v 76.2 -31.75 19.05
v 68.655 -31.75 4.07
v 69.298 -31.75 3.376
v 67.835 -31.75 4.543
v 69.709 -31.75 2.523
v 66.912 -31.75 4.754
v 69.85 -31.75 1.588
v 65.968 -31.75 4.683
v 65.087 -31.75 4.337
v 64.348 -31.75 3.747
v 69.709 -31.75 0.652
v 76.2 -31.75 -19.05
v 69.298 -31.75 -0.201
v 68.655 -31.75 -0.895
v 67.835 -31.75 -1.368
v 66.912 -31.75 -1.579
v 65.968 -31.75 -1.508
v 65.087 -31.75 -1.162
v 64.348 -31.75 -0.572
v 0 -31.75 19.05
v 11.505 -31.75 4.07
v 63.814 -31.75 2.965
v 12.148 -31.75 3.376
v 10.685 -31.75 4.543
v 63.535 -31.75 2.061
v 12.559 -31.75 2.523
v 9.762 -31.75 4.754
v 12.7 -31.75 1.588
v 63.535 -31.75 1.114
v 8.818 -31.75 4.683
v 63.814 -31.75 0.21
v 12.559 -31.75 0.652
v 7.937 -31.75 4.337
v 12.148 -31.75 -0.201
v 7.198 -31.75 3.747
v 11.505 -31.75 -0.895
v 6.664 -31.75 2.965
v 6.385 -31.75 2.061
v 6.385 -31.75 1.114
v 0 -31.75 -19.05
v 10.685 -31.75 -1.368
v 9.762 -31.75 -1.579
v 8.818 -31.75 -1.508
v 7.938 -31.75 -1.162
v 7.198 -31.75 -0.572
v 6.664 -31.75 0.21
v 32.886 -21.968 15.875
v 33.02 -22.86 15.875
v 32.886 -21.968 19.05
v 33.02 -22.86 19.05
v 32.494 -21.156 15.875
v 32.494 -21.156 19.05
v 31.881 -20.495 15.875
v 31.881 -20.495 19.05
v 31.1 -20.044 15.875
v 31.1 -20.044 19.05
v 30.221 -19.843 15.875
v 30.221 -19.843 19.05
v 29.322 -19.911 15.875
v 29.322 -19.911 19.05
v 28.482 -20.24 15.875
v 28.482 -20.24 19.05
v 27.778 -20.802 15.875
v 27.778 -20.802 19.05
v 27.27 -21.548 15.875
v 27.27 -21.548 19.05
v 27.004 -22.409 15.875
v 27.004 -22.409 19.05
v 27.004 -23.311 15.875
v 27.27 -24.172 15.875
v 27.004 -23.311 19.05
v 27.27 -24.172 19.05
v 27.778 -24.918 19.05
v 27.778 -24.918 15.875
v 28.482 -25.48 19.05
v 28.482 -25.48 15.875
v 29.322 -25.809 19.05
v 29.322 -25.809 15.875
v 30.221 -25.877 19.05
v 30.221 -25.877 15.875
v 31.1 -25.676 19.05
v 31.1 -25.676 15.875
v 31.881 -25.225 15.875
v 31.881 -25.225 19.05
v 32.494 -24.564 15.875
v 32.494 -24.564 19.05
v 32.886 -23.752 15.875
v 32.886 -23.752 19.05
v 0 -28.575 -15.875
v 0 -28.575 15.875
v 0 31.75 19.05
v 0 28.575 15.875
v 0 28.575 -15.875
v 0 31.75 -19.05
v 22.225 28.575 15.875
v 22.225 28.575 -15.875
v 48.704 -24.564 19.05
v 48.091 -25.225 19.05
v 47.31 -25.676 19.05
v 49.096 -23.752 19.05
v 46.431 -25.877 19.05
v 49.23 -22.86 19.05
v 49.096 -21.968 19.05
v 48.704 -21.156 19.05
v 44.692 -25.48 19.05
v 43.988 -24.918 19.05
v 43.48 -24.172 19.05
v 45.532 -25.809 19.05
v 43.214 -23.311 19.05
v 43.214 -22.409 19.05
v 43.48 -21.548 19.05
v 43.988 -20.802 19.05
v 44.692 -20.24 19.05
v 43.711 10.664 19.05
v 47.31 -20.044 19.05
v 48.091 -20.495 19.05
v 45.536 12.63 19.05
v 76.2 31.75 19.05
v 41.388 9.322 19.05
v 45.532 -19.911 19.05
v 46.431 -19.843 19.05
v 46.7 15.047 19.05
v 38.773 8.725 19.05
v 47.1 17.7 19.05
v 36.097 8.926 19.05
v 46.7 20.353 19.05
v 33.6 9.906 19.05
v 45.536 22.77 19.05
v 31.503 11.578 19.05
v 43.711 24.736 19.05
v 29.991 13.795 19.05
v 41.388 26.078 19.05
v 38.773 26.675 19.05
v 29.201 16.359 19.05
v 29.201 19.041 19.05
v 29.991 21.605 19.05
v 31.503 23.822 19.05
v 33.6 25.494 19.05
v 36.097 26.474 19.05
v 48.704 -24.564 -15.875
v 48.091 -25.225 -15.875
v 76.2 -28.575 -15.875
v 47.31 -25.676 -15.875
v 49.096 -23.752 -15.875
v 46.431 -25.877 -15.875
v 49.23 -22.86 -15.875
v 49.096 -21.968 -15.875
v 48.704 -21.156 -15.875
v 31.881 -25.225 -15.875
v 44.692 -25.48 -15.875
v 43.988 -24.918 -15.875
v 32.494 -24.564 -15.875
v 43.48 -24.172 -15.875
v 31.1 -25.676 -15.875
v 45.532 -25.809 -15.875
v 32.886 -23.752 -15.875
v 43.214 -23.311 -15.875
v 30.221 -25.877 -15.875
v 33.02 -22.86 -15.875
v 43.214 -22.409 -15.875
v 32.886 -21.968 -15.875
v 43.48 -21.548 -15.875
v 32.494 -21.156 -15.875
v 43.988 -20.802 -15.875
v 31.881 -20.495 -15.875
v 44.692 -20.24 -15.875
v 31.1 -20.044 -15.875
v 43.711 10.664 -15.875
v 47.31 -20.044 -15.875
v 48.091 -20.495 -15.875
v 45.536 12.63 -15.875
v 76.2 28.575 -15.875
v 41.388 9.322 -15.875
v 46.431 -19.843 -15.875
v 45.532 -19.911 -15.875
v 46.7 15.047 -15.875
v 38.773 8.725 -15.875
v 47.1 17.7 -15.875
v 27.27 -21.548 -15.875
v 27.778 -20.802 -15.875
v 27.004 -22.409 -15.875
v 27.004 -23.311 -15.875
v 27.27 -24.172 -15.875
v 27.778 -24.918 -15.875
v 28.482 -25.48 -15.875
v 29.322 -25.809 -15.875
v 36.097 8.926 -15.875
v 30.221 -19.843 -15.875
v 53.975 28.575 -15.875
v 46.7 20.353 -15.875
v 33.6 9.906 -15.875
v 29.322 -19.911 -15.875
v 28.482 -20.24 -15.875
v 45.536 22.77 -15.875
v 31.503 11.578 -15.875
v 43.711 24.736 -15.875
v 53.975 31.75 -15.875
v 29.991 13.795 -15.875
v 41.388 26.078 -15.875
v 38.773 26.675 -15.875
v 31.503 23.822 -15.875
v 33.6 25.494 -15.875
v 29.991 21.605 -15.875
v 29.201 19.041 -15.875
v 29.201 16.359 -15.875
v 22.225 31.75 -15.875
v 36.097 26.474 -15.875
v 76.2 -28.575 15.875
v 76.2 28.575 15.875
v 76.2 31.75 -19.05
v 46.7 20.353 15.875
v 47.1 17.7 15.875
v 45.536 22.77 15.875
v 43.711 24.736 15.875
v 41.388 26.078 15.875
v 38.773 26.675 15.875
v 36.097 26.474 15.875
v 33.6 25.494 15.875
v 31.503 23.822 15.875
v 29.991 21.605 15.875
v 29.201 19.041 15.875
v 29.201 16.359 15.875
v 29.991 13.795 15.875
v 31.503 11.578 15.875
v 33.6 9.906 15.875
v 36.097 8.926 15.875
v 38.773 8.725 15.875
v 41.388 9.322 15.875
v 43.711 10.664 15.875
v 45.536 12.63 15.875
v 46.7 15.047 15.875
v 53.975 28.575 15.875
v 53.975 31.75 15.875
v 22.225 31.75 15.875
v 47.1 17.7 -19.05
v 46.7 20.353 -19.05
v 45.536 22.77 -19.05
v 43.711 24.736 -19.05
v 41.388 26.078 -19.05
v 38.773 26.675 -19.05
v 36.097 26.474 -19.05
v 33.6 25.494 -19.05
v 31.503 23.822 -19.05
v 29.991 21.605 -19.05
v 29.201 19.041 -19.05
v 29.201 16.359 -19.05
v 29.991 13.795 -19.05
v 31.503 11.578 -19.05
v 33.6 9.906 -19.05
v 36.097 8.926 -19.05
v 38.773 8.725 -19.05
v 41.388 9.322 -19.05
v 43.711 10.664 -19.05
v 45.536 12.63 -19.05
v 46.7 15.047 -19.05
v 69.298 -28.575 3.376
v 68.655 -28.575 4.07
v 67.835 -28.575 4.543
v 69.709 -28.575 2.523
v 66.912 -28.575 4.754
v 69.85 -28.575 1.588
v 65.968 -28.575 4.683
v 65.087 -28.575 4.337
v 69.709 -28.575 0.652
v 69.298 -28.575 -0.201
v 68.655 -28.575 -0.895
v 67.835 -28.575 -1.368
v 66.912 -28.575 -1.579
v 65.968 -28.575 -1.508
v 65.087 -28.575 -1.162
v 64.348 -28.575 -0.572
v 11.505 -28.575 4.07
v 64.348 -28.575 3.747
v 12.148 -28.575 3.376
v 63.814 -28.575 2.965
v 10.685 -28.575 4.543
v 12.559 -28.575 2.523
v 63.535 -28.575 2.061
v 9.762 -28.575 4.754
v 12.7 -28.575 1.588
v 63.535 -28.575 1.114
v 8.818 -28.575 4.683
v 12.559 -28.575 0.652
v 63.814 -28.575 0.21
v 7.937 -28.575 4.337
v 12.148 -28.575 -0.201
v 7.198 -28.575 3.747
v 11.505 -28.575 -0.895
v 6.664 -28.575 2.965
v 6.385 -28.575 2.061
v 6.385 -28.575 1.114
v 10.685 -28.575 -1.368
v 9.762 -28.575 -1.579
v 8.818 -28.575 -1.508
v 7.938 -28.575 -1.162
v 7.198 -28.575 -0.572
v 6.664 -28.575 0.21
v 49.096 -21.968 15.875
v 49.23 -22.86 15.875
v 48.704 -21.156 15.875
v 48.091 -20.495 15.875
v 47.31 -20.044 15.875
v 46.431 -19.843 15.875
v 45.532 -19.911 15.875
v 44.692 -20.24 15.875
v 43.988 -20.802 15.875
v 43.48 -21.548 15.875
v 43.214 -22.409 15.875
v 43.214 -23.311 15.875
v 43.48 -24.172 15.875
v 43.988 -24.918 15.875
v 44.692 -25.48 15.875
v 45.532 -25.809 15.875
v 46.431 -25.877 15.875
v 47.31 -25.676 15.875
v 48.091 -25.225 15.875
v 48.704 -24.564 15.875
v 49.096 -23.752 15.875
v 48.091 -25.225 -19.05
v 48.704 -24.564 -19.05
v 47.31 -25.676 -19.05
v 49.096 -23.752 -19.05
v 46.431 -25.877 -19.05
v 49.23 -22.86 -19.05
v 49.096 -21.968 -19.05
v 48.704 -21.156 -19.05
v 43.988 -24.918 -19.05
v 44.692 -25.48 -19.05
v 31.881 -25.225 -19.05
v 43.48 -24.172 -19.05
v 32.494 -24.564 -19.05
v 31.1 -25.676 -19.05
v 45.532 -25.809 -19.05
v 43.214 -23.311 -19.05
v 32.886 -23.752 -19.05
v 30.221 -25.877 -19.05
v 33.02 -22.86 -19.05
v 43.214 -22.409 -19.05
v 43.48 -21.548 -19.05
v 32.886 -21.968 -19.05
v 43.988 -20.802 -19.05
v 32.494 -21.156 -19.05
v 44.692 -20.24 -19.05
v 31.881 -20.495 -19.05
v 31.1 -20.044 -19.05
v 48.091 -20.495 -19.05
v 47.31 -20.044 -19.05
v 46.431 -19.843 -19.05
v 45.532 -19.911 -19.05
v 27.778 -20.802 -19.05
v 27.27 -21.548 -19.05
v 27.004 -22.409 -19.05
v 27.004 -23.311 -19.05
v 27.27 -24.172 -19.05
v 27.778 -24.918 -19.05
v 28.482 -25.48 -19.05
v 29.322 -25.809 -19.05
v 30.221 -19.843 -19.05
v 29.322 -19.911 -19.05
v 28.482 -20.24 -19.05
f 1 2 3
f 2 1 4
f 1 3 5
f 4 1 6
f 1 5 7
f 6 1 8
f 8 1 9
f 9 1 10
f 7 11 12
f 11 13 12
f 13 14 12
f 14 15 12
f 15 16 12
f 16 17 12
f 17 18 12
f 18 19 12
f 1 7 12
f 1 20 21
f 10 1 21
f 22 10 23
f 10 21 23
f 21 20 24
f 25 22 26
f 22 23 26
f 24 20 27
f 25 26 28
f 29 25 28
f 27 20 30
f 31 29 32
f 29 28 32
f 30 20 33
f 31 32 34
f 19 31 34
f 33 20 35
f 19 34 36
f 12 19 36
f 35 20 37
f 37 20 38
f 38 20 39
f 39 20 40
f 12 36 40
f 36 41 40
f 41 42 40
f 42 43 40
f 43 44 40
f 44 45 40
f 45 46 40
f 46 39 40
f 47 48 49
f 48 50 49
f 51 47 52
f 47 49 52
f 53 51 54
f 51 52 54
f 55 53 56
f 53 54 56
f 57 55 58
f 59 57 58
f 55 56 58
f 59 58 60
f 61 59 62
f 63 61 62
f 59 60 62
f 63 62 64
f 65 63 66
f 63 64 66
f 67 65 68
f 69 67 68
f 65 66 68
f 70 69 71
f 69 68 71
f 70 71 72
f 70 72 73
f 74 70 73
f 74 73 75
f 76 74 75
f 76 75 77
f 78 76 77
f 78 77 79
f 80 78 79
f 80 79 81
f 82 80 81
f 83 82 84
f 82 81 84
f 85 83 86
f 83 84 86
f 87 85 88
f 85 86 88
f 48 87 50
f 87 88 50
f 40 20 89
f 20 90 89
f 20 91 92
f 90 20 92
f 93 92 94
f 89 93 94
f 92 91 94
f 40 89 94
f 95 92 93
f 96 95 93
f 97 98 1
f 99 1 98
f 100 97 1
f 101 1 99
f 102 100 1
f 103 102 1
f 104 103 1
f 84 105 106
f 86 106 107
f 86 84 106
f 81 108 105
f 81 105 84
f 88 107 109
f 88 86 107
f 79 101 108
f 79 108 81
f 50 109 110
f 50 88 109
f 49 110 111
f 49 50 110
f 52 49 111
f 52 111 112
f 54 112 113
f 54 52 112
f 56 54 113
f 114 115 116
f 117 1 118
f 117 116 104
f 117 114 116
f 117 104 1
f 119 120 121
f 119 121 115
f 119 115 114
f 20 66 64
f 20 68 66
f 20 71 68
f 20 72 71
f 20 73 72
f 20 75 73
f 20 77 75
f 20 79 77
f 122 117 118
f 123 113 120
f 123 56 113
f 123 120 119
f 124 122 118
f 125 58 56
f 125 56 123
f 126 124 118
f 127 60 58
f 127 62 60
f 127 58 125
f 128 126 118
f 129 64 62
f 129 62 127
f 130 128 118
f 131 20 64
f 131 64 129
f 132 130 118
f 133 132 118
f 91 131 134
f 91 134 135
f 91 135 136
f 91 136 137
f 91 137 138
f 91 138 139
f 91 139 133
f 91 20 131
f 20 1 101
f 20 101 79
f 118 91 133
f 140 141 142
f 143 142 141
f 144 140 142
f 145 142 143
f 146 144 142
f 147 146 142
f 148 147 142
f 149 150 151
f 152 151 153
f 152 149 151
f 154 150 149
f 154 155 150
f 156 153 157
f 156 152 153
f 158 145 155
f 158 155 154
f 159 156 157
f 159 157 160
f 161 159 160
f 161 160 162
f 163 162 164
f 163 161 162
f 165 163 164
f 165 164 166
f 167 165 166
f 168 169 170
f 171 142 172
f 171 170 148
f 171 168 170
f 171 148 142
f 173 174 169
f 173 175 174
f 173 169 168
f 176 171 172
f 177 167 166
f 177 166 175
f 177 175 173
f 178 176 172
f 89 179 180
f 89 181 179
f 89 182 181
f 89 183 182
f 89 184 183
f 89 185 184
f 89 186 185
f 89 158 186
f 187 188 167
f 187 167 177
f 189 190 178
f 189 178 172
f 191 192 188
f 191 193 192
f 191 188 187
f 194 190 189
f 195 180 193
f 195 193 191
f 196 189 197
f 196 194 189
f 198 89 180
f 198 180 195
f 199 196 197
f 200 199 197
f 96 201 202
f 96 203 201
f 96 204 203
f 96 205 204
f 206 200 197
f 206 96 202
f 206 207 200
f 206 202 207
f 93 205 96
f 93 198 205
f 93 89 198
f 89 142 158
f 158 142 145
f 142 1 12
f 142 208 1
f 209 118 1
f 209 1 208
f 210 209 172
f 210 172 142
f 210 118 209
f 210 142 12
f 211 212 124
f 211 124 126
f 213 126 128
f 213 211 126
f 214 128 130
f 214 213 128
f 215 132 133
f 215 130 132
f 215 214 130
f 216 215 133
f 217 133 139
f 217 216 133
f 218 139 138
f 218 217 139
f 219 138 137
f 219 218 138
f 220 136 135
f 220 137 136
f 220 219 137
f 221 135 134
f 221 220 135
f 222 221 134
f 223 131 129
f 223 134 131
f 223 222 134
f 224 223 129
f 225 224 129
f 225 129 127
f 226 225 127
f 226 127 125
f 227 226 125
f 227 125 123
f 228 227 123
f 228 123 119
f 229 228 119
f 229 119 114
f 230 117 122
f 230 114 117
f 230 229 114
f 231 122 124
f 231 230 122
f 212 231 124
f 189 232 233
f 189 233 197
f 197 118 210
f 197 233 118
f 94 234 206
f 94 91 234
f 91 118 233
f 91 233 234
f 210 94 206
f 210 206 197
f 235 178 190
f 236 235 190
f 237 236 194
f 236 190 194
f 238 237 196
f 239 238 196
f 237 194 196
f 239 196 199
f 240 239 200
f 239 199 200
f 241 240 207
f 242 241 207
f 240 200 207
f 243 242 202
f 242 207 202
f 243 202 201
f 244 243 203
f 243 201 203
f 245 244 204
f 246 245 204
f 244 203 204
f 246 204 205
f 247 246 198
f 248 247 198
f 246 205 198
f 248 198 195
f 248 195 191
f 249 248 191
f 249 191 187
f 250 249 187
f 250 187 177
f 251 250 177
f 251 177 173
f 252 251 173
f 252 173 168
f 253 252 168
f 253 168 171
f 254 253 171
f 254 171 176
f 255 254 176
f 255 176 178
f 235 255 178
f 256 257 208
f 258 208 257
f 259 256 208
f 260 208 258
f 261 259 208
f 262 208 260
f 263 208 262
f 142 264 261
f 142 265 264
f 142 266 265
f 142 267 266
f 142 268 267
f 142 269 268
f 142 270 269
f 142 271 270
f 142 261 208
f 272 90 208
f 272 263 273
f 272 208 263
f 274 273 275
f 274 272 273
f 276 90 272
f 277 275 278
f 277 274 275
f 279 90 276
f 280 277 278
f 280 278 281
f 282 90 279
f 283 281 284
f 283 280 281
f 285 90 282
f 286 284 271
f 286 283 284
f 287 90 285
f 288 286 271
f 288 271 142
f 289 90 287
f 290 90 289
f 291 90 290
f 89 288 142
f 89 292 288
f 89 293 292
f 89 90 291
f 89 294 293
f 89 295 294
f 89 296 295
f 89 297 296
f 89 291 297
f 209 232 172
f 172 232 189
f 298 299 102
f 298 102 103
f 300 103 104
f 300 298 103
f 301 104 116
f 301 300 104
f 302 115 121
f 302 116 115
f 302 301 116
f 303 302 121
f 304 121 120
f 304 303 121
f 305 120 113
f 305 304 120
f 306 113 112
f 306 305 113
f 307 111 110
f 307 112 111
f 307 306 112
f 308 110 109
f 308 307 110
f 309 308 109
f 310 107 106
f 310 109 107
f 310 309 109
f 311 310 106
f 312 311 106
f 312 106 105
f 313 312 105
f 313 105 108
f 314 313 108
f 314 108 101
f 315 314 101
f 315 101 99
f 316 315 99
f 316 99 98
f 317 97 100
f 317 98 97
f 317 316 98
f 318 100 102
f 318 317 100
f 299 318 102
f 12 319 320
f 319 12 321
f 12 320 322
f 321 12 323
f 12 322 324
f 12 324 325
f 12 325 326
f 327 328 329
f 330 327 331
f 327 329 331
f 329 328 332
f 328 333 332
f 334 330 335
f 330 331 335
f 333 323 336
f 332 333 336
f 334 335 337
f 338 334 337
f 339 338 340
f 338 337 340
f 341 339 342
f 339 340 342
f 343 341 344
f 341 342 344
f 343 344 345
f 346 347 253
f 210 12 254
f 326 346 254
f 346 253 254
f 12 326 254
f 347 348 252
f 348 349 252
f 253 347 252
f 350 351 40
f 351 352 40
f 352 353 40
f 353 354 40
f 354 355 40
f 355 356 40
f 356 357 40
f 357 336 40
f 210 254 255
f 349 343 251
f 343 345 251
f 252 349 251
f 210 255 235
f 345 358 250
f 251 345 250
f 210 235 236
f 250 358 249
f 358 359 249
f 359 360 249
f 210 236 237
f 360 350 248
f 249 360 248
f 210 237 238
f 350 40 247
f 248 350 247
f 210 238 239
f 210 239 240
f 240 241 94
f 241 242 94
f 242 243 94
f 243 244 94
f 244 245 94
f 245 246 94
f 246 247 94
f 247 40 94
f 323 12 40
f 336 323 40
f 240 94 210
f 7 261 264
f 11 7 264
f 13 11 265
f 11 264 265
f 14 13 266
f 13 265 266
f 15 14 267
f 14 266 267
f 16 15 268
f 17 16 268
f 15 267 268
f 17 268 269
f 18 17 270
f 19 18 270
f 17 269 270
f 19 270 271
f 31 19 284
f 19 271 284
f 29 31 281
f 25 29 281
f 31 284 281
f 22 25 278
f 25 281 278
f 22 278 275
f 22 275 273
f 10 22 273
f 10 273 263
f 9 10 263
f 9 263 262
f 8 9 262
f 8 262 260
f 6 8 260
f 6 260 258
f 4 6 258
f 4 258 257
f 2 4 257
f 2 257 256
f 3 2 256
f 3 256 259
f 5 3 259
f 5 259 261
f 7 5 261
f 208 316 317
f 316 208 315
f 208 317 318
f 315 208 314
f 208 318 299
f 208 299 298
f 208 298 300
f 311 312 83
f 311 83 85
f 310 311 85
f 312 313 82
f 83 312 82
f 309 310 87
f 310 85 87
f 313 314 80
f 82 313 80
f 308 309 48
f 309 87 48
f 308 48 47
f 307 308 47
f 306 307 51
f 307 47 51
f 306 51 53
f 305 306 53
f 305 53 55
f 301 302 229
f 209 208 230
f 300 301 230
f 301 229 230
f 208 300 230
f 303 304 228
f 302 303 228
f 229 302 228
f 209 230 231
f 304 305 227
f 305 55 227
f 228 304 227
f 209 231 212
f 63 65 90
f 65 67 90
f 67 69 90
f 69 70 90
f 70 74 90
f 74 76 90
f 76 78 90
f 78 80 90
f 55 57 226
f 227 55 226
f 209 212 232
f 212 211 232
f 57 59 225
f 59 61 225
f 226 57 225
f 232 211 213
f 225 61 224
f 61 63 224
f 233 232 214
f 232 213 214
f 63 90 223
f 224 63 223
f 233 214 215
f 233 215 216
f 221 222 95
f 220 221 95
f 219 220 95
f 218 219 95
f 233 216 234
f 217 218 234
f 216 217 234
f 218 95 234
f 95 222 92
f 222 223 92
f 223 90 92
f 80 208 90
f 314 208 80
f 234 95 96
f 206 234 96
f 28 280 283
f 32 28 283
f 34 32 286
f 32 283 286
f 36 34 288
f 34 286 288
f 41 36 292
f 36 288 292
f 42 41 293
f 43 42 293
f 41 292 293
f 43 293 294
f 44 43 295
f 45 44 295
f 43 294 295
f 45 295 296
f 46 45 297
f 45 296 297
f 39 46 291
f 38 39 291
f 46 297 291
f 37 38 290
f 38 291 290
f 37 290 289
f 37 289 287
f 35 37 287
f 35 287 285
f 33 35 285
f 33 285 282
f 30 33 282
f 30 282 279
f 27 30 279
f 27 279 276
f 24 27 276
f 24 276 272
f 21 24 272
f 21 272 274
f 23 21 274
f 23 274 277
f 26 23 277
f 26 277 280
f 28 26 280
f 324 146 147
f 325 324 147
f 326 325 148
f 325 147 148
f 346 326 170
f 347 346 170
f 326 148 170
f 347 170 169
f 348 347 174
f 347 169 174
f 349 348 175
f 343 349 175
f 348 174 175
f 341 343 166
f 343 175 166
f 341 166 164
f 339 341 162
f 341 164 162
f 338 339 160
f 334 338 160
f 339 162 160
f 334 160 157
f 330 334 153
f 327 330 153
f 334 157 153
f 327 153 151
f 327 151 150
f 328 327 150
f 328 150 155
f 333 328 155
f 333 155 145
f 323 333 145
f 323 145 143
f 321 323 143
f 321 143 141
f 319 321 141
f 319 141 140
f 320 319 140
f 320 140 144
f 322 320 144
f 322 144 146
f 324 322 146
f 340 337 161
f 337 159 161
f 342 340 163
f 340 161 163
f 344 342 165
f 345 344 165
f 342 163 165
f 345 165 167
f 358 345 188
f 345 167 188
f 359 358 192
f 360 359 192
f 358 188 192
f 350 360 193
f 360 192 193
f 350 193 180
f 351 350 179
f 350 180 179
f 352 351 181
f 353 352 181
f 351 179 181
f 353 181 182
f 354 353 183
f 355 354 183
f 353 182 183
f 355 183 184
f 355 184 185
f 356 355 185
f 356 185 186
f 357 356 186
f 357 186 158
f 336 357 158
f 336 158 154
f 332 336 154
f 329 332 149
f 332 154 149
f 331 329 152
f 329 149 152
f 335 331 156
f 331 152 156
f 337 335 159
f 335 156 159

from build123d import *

# Parameters (mm, degrees)
SKETCH1_W           = 38.1
SKETCH1_H           = 63.5
SKETCH1_W_2         = 31.75
SKETCH1_H_2         = 57.15
BOSS_EXTRUDE1_DEPTH = 76.2
SKETCH2_R           = 9
SKETCH2_R_2         = 3.025
CUT_EXTRUDE1_DEPTH  = 38.1
SKETCH3_W           = 31.75
SKETCH3_H           = 31.75
CUT_EXTRUDE2_DEPTH  = 76.2
SKETCH4_R           = 3.175
CUT_EXTRUDE3_DEPTH  = 32.75


with BuildPart() as part:
    # Sketch1 → Boss-Extrude1 (new body)
    with BuildSketch(Plane(origin=(0, 0, 0), x_dir=(0, 0, -1), z_dir=(1, 0, 0))):
        Rectangle(SKETCH1_W, SKETCH1_H)
        Rectangle(SKETCH1_W_2, SKETCH1_H_2, mode=Mode.SUBTRACT)
    extrude(amount=BOSS_EXTRUDE1_DEPTH)

    # Sketch2 → Cut-Extrude1 (cut, symmetric)
    with BuildSketch(Plane.XY):
        with Locations((38.1, 17.7)):
            Circle(SKETCH2_R)
        with Locations((46.205, -22.86)):
            Circle(SKETCH2_R_2)
        with Locations((29.995, -22.86)):
            Circle(SKETCH2_R_2)
    extrude(amount=CUT_EXTRUDE1_DEPTH, both=True, mode=Mode.SUBTRACT)

    # Sketch3 → Cut-Extrude2 (cut)
    with BuildSketch(Plane(origin=(0, 0, 0), x_dir=(1, 0, 0), z_dir=(0, 1, 0))):
        with Locations((38.1, 0)):
            Rectangle(SKETCH3_W, SKETCH3_H)
    extrude(amount=CUT_EXTRUDE2_DEPTH, mode=Mode.SUBTRACT)

    # Sketch4 → Cut-Extrude3 (cut, through all)
    with BuildSketch(Plane(origin=(0, 0, 0), x_dir=(1, 0, 0), z_dir=(0, 1, 0))):
        with Locations((9.525, -1.5875)):
            Circle(SKETCH4_R)
        with Locations((66.675, -1.5875)):
            Circle(SKETCH4_R)
    extrude(amount=-CUT_EXTRUDE3_DEPTH, mode=Mode.SUBTRACT)


solid = part.part
